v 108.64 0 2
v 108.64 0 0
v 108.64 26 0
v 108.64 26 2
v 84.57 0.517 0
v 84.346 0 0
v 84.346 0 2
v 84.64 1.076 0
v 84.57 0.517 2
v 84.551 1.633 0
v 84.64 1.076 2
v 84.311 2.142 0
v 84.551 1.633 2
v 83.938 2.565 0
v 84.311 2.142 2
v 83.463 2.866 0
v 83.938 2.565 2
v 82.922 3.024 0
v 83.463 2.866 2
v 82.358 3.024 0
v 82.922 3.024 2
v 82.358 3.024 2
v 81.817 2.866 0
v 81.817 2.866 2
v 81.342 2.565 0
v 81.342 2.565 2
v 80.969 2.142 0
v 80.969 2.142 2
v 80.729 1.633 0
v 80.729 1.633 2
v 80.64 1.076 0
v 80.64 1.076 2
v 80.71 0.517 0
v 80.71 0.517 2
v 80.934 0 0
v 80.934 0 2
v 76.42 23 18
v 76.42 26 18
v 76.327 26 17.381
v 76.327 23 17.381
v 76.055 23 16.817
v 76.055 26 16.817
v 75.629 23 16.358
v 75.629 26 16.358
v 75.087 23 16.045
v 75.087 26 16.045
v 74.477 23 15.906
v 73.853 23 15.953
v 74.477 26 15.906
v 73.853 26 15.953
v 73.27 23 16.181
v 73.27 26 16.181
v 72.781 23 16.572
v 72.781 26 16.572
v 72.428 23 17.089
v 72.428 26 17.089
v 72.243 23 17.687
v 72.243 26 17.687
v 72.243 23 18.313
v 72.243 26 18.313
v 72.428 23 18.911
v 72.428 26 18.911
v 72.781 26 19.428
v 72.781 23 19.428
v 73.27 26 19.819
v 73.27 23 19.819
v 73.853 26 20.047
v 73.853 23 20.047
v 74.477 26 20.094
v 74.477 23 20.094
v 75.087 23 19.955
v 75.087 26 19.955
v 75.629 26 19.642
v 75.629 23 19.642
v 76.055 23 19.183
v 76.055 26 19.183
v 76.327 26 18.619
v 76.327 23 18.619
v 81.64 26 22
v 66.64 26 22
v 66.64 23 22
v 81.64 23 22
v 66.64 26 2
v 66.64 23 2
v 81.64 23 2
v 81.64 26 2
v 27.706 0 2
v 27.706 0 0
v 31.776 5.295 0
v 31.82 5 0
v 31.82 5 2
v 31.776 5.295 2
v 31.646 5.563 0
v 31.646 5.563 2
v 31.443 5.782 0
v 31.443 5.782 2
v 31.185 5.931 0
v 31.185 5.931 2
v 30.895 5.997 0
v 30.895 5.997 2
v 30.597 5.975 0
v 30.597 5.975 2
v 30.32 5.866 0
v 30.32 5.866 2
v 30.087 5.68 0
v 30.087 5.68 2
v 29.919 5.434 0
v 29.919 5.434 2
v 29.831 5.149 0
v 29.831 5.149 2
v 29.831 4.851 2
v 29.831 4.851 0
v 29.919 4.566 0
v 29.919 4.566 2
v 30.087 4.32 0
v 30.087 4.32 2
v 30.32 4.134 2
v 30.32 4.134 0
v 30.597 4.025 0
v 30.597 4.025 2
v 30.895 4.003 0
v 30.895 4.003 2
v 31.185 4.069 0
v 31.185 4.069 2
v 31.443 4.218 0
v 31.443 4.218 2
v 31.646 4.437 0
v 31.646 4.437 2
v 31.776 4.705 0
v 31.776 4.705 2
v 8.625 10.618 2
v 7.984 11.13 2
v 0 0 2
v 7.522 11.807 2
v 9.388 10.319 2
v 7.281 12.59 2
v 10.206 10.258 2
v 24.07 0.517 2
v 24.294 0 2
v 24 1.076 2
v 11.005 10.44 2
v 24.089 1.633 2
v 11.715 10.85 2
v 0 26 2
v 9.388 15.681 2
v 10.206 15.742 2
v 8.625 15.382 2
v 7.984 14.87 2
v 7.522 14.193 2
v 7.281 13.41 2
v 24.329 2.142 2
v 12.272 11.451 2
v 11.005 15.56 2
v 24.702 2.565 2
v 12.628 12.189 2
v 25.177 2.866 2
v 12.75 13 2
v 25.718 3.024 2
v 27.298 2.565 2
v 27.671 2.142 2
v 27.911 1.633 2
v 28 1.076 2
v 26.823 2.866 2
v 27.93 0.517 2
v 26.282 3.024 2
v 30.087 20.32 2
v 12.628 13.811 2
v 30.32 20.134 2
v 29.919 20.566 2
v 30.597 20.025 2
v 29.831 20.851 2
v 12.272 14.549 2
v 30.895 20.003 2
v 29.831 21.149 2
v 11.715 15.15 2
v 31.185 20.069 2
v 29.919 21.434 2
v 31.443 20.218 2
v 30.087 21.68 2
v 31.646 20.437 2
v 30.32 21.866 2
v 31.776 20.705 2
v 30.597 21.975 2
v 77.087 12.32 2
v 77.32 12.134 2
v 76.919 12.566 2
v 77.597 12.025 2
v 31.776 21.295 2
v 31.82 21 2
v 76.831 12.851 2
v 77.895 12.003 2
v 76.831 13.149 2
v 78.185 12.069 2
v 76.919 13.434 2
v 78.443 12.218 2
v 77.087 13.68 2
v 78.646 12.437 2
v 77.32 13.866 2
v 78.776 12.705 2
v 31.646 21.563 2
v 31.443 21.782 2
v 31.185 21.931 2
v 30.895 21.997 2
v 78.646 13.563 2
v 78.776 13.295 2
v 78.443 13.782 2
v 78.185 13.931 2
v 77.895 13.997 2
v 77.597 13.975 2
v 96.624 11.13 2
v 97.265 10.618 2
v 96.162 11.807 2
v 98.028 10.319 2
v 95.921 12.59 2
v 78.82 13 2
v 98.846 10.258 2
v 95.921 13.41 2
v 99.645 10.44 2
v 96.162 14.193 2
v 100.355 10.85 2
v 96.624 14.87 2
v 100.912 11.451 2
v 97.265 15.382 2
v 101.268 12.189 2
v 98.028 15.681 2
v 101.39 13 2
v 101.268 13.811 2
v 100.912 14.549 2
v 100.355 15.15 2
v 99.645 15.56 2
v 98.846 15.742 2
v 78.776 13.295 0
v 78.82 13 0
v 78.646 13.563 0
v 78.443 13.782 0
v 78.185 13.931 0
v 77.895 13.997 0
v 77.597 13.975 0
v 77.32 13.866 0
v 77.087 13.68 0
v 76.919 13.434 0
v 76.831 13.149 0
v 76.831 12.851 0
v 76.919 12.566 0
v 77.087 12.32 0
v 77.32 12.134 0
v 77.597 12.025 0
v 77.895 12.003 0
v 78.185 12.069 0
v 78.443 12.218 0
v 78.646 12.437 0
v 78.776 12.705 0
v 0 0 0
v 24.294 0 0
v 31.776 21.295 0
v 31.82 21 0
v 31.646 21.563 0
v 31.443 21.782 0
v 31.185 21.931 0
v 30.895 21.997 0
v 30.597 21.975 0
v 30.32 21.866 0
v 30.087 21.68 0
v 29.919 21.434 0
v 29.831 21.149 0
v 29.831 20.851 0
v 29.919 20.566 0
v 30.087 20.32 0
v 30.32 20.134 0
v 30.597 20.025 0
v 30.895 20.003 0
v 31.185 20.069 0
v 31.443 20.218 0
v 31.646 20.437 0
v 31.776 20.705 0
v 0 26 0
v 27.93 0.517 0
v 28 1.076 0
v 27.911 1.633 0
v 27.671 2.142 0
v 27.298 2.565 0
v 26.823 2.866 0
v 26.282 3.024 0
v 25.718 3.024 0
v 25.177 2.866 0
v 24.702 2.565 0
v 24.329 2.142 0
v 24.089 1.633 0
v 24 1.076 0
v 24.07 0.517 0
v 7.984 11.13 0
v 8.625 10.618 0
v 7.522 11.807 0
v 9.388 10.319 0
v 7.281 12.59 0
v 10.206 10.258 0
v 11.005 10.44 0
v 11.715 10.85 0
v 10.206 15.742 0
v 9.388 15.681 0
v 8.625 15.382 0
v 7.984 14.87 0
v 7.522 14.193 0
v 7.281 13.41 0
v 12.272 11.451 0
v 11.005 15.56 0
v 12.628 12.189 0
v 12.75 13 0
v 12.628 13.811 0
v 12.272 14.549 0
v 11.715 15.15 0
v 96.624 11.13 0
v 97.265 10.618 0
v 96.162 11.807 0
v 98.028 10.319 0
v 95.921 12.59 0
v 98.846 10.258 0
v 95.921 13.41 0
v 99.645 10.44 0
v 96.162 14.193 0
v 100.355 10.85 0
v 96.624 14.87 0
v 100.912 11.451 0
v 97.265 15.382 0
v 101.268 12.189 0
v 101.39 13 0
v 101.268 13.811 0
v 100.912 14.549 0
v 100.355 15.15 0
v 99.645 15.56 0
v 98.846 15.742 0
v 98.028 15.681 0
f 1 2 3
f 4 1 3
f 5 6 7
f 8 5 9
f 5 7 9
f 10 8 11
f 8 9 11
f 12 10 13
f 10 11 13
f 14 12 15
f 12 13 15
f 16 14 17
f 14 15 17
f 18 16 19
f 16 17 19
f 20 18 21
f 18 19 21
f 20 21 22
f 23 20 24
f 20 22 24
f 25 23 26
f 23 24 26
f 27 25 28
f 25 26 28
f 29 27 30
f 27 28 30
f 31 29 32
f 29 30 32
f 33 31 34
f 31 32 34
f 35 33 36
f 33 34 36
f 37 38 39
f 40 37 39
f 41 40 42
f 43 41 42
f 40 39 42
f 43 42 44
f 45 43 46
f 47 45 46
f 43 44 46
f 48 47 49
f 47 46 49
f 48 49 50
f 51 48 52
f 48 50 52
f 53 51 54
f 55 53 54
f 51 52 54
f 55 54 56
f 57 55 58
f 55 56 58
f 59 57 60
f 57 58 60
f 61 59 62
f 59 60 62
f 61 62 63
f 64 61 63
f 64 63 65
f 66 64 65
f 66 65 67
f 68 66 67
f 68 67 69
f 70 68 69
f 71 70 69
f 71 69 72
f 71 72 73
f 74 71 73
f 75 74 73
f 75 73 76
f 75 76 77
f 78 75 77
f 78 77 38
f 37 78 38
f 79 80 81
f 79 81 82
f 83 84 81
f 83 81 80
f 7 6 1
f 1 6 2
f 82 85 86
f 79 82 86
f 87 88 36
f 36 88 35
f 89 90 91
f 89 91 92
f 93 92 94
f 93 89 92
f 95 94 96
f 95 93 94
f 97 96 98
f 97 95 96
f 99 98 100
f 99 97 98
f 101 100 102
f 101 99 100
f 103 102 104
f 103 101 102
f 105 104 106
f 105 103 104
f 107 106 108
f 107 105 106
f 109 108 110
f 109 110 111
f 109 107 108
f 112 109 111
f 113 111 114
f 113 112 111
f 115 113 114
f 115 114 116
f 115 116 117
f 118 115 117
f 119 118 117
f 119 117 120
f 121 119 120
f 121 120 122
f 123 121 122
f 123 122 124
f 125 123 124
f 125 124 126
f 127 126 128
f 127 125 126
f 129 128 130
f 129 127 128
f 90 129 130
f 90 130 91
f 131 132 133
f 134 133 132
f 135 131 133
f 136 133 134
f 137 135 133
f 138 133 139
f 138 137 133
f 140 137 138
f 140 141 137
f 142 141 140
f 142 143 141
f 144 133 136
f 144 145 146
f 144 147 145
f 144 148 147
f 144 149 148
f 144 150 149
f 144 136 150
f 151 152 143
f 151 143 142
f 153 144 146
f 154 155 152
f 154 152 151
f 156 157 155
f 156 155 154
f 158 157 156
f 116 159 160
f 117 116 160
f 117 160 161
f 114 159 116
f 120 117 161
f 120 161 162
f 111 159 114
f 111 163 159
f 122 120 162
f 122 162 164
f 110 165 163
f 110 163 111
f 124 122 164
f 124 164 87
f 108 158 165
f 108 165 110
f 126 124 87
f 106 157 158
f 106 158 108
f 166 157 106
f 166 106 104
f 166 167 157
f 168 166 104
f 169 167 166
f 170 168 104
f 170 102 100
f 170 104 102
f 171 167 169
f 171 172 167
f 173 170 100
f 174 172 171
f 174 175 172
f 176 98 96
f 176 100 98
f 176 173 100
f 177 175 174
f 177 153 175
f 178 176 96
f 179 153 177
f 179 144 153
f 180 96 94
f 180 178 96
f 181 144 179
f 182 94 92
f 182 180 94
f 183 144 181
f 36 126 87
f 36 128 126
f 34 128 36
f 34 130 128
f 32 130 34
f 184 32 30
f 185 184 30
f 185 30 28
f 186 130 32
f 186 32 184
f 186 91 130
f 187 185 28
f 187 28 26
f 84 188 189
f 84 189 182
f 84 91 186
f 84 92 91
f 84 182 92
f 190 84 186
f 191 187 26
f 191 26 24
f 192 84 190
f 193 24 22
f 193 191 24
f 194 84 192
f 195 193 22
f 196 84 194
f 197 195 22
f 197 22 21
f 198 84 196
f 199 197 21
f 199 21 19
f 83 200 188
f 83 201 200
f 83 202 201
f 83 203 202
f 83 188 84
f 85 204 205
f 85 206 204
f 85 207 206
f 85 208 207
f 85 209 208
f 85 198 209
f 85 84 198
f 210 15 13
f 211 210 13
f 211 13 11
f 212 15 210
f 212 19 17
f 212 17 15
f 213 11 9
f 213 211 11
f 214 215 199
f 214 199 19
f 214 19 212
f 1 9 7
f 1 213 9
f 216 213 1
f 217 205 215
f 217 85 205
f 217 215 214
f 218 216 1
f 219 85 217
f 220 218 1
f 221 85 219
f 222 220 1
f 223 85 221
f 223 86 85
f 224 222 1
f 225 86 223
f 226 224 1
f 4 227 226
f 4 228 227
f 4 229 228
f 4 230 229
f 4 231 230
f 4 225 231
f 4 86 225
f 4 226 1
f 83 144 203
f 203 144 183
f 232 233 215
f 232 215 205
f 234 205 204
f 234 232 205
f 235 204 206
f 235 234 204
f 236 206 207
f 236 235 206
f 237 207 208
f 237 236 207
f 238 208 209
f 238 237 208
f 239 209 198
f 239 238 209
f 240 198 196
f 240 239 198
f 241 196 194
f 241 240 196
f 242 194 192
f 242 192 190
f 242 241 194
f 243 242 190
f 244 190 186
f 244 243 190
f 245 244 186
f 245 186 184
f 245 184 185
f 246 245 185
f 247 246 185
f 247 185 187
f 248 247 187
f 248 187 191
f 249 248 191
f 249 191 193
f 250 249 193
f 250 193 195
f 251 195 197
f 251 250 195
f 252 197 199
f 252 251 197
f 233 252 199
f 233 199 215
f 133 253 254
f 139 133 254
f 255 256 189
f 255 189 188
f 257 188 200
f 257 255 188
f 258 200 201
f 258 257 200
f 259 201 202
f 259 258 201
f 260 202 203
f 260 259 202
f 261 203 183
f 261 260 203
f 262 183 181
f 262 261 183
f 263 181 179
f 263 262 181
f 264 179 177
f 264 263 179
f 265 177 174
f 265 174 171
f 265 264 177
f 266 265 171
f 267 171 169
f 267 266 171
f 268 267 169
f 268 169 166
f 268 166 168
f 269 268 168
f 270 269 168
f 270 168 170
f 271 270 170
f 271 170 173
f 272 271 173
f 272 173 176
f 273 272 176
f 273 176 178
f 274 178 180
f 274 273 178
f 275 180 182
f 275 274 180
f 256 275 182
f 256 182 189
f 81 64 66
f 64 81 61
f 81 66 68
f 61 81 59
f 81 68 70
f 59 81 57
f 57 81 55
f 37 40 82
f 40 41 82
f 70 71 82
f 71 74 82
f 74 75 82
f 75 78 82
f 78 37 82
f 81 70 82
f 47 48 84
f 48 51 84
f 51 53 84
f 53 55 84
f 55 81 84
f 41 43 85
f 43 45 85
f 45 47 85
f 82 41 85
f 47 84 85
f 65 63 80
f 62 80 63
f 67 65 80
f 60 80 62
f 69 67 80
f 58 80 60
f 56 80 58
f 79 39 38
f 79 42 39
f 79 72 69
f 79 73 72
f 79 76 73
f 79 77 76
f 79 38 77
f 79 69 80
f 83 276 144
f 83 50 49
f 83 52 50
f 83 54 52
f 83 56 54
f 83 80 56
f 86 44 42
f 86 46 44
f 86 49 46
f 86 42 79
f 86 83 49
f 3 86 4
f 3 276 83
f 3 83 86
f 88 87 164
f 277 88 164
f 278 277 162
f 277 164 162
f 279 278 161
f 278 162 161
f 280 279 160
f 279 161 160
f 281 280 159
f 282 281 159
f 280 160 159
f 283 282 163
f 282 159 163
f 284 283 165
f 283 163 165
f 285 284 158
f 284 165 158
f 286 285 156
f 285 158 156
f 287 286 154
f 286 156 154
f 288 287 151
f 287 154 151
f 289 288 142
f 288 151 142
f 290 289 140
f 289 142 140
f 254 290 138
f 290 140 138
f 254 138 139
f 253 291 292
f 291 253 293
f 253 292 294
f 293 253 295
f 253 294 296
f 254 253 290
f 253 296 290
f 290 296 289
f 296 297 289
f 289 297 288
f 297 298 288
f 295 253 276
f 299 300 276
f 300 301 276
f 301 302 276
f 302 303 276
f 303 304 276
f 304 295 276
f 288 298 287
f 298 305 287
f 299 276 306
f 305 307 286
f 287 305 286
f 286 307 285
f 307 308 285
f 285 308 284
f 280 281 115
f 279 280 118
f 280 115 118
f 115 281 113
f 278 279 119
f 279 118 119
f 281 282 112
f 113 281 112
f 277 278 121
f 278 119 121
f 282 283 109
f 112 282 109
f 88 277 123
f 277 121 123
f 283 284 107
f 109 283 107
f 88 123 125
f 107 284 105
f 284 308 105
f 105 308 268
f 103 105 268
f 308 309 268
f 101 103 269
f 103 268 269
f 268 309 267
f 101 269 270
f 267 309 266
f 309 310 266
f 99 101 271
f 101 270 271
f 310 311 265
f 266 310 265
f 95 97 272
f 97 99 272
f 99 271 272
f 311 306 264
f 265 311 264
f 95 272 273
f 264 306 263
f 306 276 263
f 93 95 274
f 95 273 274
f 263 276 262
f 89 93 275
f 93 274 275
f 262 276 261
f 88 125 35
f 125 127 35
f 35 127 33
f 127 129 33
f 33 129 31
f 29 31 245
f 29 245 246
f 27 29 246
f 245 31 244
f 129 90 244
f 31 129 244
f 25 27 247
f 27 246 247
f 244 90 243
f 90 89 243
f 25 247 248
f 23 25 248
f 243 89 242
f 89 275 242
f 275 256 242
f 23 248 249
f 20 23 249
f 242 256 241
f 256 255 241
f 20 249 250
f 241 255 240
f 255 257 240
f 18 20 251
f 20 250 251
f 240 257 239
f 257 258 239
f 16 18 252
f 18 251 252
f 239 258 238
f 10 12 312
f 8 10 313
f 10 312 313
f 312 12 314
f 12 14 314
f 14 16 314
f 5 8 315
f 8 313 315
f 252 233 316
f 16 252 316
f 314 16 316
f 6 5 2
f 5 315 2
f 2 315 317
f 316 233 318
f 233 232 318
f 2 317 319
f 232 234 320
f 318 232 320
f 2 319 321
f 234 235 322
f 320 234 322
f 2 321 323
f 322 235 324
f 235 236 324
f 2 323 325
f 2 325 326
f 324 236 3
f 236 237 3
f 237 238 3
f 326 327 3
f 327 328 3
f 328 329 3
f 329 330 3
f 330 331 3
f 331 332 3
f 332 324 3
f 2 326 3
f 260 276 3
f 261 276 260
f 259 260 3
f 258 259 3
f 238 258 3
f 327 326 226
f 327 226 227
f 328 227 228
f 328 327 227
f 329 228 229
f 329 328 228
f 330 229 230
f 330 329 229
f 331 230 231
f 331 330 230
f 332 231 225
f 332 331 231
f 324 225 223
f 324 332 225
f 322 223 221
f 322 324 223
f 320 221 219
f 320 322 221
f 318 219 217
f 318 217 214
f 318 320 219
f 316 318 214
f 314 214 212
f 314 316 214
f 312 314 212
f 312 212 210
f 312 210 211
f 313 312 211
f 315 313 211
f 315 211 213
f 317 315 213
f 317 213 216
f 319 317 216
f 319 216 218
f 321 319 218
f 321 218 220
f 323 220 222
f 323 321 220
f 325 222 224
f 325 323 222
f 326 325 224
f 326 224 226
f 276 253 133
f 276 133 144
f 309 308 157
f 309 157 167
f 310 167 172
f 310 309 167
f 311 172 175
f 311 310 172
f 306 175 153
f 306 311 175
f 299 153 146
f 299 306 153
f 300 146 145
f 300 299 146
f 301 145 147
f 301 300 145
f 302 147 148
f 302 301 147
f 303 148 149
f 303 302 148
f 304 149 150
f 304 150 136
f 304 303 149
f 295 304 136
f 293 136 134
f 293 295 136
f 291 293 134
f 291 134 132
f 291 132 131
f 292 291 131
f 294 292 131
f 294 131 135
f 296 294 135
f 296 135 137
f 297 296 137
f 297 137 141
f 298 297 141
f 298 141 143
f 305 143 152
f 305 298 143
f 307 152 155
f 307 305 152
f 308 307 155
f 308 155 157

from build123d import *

# Parameters (mm, degrees)
SKETCH1_W           = 108.64
SKETCH1_H           = 26
SKETCH1_R           = 1
SKETCH1_R_2         = 2.75
BOSS_EXTRUDE1_DEPTH = 2
CUT_EXTRUDE2_REACH  = 4
SKETCH5_R           = 2
SKETCH3_W           = 15
SKETCH3_H           = 3
BOSS_EXTRUDE2_DEPTH = 20
SKETCH4_R           = 2.1
CUT_EXTRUDE1_DEPTH  = 15


with BuildPart() as part:
    # Sketch1 → Boss-Extrude1 (new body)
    with BuildSketch(Plane.XY):
        with Locations((54.32, 13)):
            Rectangle(SKETCH1_W, SKETCH1_H)
        with Locations((30.82, 21)):
            Circle(SKETCH1_R, mode=Mode.SUBTRACT)
        with Locations((30.82, 5)):
            Circle(SKETCH1_R, mode=Mode.SUBTRACT)
        with Locations((77.82, 13)):
            Circle(SKETCH1_R, mode=Mode.SUBTRACT)
        with Locations((10, 13)):
            Circle(SKETCH1_R_2, mode=Mode.SUBTRACT)
        with Locations((98.64, 13)):
            Circle(SKETCH1_R_2, mode=Mode.SUBTRACT)
    extrude(amount=BOSS_EXTRUDE1_DEPTH)

    # Sketch5 → Cut-Extrude2 (cut, up to next)
    with BuildSketch(Plane.XY.offset(2), mode=Mode.PRIVATE) as cut_extrude2_sk1:
        with Locations((26, 1.043474904)):
            Circle(SKETCH5_R)
    cut_extrude2_tool1 = extrude(cut_extrude2_sk1.sketch, amount=-CUT_EXTRUDE2_REACH, mode=Mode.PRIVATE) & part.part
    add(cut_extrude2_tool1.solids().sort_by_distance((26, 1.043475, 2))[0], mode=Mode.SUBTRACT)
    # Sketch5 → Cut-Extrude2 (cut, up to next)
    with BuildSketch(Plane.XY.offset(2), mode=Mode.PRIVATE) as cut_extrude2_sk2:
        with Locations((82.64, 1.043474904)):
            Circle(SKETCH5_R)
    cut_extrude2_tool2 = extrude(cut_extrude2_sk2.sketch, amount=-CUT_EXTRUDE2_REACH, mode=Mode.PRIVATE) & part.part
    add(cut_extrude2_tool2.solids().sort_by_distance((82.64, 1.043475, 2))[0], mode=Mode.SUBTRACT)

    # Sketch3 → Boss-Extrude2 (add)
    with BuildSketch(Plane.XY.offset(2)):
        with Locations((74.14, 24.5)):
            Rectangle(SKETCH3_W, SKETCH3_H)
    extrude(amount=BOSS_EXTRUDE2_DEPTH)

    # Sketch4 → Cut-Extrude1 (cut)
    with BuildSketch(Plane(origin=(0, 26, 0), x_dir=(1, 0, 0), z_dir=(0, 1, 0))):
        with Locations((74.32, -18)):
            Circle(SKETCH4_R)
    extrude(amount=-CUT_EXTRUDE1_DEPTH, mode=Mode.SUBTRACT)


solid = part.part
